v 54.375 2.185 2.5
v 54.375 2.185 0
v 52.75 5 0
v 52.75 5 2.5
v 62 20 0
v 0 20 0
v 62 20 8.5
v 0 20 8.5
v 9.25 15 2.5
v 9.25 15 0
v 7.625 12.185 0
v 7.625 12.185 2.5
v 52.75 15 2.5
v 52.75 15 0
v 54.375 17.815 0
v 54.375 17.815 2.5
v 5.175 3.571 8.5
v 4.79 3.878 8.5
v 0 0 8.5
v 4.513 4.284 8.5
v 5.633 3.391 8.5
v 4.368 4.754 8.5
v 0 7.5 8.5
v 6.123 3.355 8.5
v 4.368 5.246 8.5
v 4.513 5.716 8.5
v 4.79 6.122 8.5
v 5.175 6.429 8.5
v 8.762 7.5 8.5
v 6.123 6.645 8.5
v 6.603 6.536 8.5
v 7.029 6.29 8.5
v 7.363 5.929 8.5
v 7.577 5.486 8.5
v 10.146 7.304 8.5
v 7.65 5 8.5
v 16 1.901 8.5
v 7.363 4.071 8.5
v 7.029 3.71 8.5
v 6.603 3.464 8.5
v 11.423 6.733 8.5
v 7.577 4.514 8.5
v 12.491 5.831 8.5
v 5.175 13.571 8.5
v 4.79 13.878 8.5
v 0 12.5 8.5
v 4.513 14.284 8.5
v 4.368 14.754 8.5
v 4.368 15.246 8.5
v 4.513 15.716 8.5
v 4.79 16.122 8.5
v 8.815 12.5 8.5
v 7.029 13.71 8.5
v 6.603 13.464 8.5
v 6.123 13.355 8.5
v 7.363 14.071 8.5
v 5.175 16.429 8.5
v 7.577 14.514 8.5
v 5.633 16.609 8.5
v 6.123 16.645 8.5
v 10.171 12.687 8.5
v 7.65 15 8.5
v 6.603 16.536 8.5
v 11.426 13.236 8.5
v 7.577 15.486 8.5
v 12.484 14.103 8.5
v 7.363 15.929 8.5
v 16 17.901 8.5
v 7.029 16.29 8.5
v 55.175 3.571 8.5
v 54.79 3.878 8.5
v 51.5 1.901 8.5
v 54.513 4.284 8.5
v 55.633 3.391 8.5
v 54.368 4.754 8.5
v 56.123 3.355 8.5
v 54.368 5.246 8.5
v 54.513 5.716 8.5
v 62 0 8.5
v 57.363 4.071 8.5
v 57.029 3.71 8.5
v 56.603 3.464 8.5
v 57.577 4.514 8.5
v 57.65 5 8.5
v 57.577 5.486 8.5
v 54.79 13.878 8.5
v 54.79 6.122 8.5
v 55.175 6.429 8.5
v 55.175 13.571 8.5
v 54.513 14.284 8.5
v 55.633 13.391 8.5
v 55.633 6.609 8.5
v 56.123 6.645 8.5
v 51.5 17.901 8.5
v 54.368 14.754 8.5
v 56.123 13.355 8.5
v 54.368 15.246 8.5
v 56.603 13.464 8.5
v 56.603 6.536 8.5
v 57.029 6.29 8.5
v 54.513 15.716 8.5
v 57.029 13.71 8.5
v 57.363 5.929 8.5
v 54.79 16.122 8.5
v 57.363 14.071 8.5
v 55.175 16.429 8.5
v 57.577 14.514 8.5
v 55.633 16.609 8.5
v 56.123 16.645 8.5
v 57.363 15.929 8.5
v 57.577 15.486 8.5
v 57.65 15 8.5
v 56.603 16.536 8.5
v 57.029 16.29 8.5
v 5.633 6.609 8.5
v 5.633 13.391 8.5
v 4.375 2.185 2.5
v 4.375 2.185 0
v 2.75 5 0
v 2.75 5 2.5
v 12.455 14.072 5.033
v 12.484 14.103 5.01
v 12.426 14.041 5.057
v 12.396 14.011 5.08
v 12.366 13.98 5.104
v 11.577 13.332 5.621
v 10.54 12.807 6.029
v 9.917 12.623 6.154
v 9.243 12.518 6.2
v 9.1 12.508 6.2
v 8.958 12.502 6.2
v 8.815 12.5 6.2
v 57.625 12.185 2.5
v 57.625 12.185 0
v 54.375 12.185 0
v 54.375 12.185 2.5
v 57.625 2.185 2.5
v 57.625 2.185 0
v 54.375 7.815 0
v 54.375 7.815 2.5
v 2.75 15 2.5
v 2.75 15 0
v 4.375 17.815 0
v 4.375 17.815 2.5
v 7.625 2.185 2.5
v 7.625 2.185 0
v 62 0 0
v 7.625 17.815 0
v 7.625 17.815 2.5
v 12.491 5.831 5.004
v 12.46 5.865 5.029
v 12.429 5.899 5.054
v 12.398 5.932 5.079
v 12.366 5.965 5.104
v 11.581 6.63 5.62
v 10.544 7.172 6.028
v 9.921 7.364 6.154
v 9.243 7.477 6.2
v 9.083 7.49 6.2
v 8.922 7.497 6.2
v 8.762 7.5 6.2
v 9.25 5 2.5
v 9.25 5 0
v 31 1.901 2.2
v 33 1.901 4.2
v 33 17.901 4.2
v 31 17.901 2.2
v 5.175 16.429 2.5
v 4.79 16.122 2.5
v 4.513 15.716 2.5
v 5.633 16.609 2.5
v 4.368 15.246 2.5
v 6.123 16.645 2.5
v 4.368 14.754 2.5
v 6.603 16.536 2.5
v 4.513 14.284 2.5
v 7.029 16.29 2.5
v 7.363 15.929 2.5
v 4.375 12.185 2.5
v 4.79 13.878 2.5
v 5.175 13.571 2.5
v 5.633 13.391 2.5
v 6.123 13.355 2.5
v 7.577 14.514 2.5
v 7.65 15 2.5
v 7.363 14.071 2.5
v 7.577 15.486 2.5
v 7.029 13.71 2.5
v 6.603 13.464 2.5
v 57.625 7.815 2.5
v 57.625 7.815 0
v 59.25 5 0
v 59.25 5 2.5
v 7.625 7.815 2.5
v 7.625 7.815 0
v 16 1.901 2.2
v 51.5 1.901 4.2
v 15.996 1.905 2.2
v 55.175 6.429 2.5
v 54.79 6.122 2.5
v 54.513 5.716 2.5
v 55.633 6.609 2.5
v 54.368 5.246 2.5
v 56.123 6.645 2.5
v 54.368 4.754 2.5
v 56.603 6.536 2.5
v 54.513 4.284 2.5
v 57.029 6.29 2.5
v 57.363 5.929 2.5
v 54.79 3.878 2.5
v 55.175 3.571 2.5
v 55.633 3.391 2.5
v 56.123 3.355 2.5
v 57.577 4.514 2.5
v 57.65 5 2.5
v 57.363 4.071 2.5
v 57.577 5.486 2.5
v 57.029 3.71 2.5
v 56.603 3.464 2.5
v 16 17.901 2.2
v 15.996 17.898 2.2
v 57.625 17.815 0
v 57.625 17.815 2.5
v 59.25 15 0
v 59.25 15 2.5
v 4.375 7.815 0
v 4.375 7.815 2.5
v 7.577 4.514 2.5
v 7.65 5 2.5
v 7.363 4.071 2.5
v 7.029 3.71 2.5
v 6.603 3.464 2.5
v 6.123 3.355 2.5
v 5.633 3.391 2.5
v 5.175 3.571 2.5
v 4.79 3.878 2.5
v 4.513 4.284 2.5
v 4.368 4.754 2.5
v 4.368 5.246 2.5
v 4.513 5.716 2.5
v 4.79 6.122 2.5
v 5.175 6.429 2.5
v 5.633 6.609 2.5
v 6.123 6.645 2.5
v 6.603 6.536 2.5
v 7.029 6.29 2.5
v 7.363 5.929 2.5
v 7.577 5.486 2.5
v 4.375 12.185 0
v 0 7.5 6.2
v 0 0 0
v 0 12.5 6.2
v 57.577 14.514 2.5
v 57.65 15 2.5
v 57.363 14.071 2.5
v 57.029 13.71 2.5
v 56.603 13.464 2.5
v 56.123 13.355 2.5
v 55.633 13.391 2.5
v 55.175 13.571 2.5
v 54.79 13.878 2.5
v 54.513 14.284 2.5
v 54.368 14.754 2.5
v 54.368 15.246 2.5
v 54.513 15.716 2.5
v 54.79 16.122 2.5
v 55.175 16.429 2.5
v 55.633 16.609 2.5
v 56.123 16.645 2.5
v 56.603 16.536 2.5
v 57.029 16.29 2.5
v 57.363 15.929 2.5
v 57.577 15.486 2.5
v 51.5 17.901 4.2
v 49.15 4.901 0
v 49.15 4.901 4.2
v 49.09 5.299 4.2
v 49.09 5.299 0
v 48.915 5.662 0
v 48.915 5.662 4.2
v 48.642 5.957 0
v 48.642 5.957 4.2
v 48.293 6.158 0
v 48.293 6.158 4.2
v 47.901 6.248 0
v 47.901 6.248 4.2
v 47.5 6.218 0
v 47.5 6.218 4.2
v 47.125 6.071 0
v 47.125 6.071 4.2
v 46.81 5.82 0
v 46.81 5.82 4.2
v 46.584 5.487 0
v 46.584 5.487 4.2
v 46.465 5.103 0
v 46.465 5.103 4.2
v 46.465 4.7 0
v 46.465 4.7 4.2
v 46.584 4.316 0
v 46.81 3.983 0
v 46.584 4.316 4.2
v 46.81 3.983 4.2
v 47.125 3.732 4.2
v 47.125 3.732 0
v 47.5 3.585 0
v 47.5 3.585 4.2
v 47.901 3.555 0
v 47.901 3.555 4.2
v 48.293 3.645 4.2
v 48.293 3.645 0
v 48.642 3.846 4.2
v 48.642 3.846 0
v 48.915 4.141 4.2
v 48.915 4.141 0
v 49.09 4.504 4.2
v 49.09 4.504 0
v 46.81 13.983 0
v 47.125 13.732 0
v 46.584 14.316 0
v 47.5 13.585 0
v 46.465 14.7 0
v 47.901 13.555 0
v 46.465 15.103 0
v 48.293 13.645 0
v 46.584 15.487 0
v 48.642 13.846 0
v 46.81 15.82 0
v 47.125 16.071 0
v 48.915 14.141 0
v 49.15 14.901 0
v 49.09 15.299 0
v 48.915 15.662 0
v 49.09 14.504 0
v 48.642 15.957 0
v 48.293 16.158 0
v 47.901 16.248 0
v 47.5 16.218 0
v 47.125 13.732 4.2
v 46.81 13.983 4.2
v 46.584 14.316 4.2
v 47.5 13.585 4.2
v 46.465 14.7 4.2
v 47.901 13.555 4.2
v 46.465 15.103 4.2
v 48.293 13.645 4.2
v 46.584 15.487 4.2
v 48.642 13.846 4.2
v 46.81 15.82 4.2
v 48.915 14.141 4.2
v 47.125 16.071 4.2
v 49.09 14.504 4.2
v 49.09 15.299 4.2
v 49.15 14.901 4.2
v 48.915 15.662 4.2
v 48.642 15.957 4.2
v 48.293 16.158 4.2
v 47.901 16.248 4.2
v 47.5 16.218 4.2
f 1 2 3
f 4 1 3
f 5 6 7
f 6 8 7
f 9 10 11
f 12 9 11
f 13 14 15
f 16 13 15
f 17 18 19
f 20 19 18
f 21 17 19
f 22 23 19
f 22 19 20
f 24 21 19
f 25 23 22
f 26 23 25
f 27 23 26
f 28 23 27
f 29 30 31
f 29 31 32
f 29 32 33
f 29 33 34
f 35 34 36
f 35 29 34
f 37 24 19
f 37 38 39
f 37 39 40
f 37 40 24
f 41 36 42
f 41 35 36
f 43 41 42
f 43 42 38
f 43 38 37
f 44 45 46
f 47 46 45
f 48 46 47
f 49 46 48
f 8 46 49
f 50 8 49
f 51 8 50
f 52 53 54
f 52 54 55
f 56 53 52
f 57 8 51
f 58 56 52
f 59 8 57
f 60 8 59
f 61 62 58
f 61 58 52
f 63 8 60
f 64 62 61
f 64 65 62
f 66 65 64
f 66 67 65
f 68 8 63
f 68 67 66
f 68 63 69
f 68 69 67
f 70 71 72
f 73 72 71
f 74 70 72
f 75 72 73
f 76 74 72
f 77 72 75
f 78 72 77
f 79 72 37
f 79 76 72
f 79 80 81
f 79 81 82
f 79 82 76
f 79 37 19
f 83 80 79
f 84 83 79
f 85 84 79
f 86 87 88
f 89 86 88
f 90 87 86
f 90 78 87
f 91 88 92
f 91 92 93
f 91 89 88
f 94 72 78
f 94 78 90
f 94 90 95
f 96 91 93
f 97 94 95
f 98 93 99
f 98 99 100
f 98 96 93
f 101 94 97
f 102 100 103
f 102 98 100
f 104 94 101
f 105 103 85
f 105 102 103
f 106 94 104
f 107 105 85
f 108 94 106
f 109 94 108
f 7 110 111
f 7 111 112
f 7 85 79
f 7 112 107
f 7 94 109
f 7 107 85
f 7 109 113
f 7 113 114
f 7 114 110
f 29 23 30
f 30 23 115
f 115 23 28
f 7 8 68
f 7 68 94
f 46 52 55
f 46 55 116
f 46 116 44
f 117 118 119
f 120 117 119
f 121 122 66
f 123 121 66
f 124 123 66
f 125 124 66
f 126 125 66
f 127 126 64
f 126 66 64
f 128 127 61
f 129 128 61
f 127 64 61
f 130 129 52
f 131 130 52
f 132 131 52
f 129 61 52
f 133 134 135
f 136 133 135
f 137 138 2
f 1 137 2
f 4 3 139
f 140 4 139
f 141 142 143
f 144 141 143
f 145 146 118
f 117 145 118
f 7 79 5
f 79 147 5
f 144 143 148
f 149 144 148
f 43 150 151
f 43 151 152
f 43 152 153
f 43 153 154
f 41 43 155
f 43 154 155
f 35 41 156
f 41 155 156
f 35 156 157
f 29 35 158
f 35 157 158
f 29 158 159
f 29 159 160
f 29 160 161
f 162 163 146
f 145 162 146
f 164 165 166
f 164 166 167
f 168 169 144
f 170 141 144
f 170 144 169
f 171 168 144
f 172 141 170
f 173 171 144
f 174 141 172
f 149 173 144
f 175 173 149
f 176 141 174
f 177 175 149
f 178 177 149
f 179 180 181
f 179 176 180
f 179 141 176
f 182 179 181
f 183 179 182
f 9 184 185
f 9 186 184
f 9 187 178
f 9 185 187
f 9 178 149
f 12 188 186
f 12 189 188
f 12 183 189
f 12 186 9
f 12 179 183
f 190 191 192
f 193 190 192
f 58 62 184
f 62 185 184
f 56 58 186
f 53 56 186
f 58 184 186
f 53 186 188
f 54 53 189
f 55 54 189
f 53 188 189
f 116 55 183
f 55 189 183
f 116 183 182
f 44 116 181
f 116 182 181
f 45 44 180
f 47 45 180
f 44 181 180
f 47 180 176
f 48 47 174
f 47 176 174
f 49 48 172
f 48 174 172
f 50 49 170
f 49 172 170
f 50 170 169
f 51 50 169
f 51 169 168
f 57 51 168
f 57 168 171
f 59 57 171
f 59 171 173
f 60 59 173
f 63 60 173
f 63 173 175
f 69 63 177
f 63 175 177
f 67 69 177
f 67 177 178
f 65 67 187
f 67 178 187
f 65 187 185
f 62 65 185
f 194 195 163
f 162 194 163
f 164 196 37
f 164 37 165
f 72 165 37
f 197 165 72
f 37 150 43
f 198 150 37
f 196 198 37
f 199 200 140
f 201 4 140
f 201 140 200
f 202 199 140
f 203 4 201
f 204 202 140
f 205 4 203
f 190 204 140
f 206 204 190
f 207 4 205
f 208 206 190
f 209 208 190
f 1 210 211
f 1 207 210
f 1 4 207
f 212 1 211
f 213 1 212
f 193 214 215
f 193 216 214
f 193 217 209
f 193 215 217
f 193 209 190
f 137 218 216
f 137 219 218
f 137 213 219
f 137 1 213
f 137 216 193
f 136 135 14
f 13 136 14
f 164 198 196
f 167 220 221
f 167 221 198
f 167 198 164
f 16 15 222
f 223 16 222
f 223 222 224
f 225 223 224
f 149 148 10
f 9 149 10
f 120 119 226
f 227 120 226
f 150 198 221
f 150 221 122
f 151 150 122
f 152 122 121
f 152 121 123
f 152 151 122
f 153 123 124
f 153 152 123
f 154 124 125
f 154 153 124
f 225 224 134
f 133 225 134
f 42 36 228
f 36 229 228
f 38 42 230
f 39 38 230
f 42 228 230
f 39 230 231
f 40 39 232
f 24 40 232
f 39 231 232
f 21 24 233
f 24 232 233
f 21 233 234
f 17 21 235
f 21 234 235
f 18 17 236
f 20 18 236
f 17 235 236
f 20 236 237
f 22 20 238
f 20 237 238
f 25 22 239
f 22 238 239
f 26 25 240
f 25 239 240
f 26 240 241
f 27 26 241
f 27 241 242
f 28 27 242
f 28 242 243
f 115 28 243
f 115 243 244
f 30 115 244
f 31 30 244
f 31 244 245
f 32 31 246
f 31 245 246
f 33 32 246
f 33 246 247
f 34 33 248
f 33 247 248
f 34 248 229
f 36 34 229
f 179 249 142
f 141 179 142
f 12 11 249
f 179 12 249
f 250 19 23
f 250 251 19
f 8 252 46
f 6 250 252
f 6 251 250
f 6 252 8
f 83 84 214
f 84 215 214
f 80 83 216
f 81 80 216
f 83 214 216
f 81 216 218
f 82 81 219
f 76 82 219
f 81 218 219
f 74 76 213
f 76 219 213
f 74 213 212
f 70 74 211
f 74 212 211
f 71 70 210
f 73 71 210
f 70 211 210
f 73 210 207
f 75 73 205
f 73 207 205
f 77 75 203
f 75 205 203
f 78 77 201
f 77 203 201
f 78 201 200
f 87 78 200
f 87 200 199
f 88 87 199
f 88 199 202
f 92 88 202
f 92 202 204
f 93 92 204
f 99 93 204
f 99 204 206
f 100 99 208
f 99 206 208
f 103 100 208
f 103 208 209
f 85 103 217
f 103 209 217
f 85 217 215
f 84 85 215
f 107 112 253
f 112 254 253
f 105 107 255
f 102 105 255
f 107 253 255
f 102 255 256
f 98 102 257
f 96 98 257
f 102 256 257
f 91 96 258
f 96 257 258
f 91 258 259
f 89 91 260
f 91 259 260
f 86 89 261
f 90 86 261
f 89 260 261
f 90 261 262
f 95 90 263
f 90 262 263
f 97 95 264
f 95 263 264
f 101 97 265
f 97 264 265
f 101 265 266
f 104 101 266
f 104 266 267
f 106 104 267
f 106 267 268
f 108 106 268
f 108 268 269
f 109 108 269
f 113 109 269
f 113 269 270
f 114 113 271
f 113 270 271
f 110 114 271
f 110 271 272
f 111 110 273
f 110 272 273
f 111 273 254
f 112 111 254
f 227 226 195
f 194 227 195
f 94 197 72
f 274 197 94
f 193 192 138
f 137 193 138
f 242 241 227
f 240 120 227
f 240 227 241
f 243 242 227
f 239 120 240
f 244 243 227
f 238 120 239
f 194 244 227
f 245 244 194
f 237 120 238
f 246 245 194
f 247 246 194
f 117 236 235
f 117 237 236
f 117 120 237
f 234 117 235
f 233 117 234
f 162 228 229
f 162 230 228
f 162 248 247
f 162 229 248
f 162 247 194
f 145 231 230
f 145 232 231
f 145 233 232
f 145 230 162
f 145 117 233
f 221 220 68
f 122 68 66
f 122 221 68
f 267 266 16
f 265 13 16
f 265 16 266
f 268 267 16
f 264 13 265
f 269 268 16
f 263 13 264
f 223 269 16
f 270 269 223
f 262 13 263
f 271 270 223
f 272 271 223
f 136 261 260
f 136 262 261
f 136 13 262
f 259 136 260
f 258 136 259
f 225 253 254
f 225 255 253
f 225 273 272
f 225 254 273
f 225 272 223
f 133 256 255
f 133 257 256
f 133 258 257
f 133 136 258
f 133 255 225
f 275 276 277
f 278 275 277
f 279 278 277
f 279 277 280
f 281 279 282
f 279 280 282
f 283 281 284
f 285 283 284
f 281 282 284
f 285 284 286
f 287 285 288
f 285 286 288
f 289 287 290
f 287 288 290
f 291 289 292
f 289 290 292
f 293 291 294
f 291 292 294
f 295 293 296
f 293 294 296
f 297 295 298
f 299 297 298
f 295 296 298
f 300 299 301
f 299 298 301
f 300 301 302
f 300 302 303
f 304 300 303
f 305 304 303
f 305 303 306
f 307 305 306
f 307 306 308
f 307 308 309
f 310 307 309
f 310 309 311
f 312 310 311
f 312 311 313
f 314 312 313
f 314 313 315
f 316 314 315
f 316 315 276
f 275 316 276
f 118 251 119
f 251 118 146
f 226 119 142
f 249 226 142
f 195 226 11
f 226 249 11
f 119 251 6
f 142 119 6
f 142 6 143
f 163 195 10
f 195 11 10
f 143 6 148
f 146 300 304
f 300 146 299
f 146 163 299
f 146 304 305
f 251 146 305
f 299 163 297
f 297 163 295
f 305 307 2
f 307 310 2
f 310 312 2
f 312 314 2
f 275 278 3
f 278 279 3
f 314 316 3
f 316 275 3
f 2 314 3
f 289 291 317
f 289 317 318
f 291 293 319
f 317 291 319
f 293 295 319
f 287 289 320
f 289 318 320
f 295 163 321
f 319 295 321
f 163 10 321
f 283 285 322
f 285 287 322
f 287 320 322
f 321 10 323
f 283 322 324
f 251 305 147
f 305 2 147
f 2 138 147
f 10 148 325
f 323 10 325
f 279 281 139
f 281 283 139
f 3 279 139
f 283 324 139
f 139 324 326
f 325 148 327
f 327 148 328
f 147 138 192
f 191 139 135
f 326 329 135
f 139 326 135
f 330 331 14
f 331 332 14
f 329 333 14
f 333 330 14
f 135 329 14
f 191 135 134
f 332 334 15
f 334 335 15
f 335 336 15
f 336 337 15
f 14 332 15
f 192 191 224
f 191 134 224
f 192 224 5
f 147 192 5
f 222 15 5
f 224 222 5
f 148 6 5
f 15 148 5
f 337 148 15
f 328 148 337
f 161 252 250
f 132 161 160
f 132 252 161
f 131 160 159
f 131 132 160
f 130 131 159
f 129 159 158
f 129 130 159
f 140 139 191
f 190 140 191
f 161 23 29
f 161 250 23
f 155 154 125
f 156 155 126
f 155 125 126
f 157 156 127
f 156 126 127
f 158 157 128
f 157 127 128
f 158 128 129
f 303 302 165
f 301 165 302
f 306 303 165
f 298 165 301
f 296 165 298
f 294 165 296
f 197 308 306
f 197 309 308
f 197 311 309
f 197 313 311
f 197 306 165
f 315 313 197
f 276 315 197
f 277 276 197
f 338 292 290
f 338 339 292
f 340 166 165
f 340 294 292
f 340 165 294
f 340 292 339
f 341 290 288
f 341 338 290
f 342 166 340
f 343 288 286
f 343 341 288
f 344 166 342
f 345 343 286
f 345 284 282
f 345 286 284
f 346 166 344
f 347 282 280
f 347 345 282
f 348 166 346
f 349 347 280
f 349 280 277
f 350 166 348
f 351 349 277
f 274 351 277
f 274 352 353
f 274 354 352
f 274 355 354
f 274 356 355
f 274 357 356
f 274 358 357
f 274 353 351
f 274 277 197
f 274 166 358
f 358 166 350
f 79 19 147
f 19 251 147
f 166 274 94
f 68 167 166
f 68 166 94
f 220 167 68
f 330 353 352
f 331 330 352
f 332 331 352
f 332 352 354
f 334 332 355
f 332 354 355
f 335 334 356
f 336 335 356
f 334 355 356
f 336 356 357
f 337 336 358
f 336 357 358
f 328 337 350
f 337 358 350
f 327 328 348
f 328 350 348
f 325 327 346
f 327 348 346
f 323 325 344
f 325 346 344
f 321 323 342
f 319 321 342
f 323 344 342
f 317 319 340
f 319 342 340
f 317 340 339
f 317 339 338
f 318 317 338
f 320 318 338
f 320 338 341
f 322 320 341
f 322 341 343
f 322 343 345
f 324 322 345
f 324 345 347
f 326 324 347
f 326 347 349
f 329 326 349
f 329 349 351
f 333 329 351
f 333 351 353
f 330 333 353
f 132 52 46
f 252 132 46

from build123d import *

# Parameters (mm, degrees)
F0_W         = 65
F0_H         = 20
F1_DEPTH     = 7.5
F3_DEPTH     = 2.5
F4_R         = 1.65
F5_DEPTH     = 5
F7_DEPTH     = 3.3
F8_W         = 12
F8_H         = 16
F9_DEPTH     = 2
F10_R        = 1.35
F11_DEPTH    = 5
F12_T4_DEPTH = 16
F15_DEPTH    = 2
F16_DEPTH    = 20
F17_W        = 20
F17_H        = 7.5
F18_DEPTH    = 3
F19_W        = 10.9964999743
F19_H        = 5
F20_DEPTH    = 2
F21_DEPTH    = 1
F22_R        = 5
F23_DEPTH    = 0.5


# Not quite as in the source:
# - a fillet or chamfer that OpenCascade refuses, or shapes differently, is made with other operations: its cross-section is extruded or revolved along the edge and cut away or added


with BuildPart() as f1:
    # F0 (on Top) → F1 (new body)
    with BuildSketch(Plane.XY):
        with Locations((32.5, 10)):
            Rectangle(F0_W, F0_H)
    extrude(amount=F1_DEPTH)

    # F2 (on face) → F3 (cut)
    with BuildSketch(Plane(origin=(0, 0, 0), x_dir=(1, 0, 0), z_dir=(0, 0, -1))):
        Polygon((4.375, -7.8145825623), (7.625, -7.8145825623), (9.25, -5), (7.625, -2.1854174377), (4.375, -2.1854174377), (2.75, -5), align=None)
        Polygon((7.625, -12.1854174377), (4.375, -12.1854174377), (2.75, -15), (4.375, -17.8145825623), (7.625, -17.8145825623), (9.25, -15), align=None)
        Polygon((54.375, -7.8145825623), (57.625, -7.8145825623), (59.25, -5), (57.625, -2.1854174377), (54.375, -2.1854174377), (52.75, -5), align=None)
        Polygon((54.375, -17.8145825623), (57.625, -17.8145825623), (59.25, -15), (57.625, -12.1854174377), (54.375, -12.1854174377), (52.75, -15), align=None)
    extrude(amount=-F3_DEPTH, mode=Mode.SUBTRACT)

    # F4 (on face) → F5 (cut)
    with BuildSketch(Plane(origin=(0, 0, 2.5), x_dir=(1, 0, 0), z_dir=(0, 0, -1))):
        with Locations((6, -5)):
            Circle(F4_R)
        with Locations((6, -15)):
            Circle(F4_R)
        with Locations((56, -5)):
            Circle(F4_R)
        with Locations((56, -15)):
            Circle(F4_R)
    extrude(amount=-F5_DEPTH, mode=Mode.SUBTRACT)

    # F6 (on face) → F7 (cut)
    with BuildSketch(Plane.XY.offset(7.5)):
        Polygon((51, 17.9014432635), (16, 17.9014432635), (16, 12.5), (16, 7.5), (16, 1.9014432635), (51, 1.9014432635), align=None)
        Polygon((16, 12.5), (16, 17.9014432635), (11, 12.5), align=None)
        Polygon((16, 7.5), (16, 12.5), (11, 12.5), (0, 12.5), (0, 7.5), (11, 7.5), align=None)
        Polygon((16, 1.9014432635), (16, 7.5), (11, 7.5), align=None)
    extrude(amount=-F7_DEPTH, mode=Mode.SUBTRACT)

    # F8 (on face) → F9 (cut)
    with BuildSketch(Plane.XY.offset(4.2)):
        with Locations((22, 9.9014432635)):
            Rectangle(F8_W, F8_H)
    extrude(amount=-F9_DEPTH, mode=Mode.SUBTRACT)

    # F10 (on face) → F11 (cut)
    with BuildSketch(Plane.XY.offset(4.2)):
        with Locations((47.8, 14.9014432635)):
            Circle(F10_R)
        with Locations((47.8, 4.9014432635)):
            Circle(F10_R)
    extrude(amount=-F11_DEPTH, mode=Mode.SUBTRACT)

    # F12: chamfer of 5 on 1 edges, made by hand


with BuildPart() as f12_tool2:
    # F12_s3 → F12_t4 (new body)
    with BuildSketch(Plane.XZ.offset(-1.9014432635)):
        Polygon((33, 4.2), (28, -0.8), (28, 4.2), align=None)
    extrude(amount=-F12_T4_DEPTH)

    split(bisect_by=Plane.XY.offset(2.2), keep=Keep.TOP)


with BuildPart() as f1_1:
    add(f1.part)

    # F12_t1: cut F12_tool2
    add(f12_tool2.part, mode=Mode.SUBTRACT)

    # F14 (on face) → F15 (cut)
    with BuildSketch(Plane.XY.offset(4.2)):
        Polygon((16, 17.9014432635), (11, 12.5), (11, 7.5), (16, 1.9014432635), align=None)
    extrude(amount=-F15_DEPTH, mode=Mode.SUBTRACT)

    # F13 (on face) → F16 (join)
    with BuildSketch(Plane.XZ):
        Polygon((10.9964999743, 2.2), (15.9964999743, 2.2), (10.9964999743, 6.2), align=None)
    extrude(amount=-F16_DEPTH)

    # F17 (on face) → F18 (cut)
    with BuildSketch(Plane.YZ.offset(65)):
        with Locations((10, 3.75)):
            Rectangle(F17_W, F17_H)
    extrude(amount=-F18_DEPTH, mode=Mode.SUBTRACT)

    # F19 (on face) → F20 (join)
    with BuildSketch(Plane.XY.offset(4.2)):
        with Locations((5.4982499871, 10)):
            Rectangle(F19_W, F19_H)
    extrude(amount=F20_DEPTH)

    # F21 (add): a face of the model
    f21_faces = [f1_1.faces().sort_by_distance(p)[0] for p in [
        (61.348540101, 10, 7.5),
    ]]
    extrude(f21_faces, amount=F21_DEPTH)

    # F22 (call 1 of 3: OpenCascade refuses the feature's edges together)
    f22_edges = [f1_1.edges().sort_by_distance(p)[0] for p in [
        (11, 12.5, 7.3486),
    ]]
    fillet(f22_edges, radius=F22_R)

    # F22#2 (call 2 of 3)
    f22_2_edges = [f1_1.edges().sort_by_distance(p)[0] for p in [
        (10.9965, 10, 6.2),
    ]]
    fillet(f22_2_edges, radius=F22_R)

    # F22#3 (call 3 of 3)
    f22_3_edges = [f1_1.edges().sort_by_distance(p)[0] for p in [
        (11, 7.5, 7.3486),
    ]]
    fillet(f22_3_edges, radius=F22_R)

    # F23 (cut): a face of the model
    f23_faces = [f1_1.faces().sort_by_distance(p)[0] for p in [
        (51, 9.9014432635, 6.35),
    ]]
    extrude(f23_faces, amount=-F23_DEPTH, mode=Mode.SUBTRACT)


solid = f1_1.part
